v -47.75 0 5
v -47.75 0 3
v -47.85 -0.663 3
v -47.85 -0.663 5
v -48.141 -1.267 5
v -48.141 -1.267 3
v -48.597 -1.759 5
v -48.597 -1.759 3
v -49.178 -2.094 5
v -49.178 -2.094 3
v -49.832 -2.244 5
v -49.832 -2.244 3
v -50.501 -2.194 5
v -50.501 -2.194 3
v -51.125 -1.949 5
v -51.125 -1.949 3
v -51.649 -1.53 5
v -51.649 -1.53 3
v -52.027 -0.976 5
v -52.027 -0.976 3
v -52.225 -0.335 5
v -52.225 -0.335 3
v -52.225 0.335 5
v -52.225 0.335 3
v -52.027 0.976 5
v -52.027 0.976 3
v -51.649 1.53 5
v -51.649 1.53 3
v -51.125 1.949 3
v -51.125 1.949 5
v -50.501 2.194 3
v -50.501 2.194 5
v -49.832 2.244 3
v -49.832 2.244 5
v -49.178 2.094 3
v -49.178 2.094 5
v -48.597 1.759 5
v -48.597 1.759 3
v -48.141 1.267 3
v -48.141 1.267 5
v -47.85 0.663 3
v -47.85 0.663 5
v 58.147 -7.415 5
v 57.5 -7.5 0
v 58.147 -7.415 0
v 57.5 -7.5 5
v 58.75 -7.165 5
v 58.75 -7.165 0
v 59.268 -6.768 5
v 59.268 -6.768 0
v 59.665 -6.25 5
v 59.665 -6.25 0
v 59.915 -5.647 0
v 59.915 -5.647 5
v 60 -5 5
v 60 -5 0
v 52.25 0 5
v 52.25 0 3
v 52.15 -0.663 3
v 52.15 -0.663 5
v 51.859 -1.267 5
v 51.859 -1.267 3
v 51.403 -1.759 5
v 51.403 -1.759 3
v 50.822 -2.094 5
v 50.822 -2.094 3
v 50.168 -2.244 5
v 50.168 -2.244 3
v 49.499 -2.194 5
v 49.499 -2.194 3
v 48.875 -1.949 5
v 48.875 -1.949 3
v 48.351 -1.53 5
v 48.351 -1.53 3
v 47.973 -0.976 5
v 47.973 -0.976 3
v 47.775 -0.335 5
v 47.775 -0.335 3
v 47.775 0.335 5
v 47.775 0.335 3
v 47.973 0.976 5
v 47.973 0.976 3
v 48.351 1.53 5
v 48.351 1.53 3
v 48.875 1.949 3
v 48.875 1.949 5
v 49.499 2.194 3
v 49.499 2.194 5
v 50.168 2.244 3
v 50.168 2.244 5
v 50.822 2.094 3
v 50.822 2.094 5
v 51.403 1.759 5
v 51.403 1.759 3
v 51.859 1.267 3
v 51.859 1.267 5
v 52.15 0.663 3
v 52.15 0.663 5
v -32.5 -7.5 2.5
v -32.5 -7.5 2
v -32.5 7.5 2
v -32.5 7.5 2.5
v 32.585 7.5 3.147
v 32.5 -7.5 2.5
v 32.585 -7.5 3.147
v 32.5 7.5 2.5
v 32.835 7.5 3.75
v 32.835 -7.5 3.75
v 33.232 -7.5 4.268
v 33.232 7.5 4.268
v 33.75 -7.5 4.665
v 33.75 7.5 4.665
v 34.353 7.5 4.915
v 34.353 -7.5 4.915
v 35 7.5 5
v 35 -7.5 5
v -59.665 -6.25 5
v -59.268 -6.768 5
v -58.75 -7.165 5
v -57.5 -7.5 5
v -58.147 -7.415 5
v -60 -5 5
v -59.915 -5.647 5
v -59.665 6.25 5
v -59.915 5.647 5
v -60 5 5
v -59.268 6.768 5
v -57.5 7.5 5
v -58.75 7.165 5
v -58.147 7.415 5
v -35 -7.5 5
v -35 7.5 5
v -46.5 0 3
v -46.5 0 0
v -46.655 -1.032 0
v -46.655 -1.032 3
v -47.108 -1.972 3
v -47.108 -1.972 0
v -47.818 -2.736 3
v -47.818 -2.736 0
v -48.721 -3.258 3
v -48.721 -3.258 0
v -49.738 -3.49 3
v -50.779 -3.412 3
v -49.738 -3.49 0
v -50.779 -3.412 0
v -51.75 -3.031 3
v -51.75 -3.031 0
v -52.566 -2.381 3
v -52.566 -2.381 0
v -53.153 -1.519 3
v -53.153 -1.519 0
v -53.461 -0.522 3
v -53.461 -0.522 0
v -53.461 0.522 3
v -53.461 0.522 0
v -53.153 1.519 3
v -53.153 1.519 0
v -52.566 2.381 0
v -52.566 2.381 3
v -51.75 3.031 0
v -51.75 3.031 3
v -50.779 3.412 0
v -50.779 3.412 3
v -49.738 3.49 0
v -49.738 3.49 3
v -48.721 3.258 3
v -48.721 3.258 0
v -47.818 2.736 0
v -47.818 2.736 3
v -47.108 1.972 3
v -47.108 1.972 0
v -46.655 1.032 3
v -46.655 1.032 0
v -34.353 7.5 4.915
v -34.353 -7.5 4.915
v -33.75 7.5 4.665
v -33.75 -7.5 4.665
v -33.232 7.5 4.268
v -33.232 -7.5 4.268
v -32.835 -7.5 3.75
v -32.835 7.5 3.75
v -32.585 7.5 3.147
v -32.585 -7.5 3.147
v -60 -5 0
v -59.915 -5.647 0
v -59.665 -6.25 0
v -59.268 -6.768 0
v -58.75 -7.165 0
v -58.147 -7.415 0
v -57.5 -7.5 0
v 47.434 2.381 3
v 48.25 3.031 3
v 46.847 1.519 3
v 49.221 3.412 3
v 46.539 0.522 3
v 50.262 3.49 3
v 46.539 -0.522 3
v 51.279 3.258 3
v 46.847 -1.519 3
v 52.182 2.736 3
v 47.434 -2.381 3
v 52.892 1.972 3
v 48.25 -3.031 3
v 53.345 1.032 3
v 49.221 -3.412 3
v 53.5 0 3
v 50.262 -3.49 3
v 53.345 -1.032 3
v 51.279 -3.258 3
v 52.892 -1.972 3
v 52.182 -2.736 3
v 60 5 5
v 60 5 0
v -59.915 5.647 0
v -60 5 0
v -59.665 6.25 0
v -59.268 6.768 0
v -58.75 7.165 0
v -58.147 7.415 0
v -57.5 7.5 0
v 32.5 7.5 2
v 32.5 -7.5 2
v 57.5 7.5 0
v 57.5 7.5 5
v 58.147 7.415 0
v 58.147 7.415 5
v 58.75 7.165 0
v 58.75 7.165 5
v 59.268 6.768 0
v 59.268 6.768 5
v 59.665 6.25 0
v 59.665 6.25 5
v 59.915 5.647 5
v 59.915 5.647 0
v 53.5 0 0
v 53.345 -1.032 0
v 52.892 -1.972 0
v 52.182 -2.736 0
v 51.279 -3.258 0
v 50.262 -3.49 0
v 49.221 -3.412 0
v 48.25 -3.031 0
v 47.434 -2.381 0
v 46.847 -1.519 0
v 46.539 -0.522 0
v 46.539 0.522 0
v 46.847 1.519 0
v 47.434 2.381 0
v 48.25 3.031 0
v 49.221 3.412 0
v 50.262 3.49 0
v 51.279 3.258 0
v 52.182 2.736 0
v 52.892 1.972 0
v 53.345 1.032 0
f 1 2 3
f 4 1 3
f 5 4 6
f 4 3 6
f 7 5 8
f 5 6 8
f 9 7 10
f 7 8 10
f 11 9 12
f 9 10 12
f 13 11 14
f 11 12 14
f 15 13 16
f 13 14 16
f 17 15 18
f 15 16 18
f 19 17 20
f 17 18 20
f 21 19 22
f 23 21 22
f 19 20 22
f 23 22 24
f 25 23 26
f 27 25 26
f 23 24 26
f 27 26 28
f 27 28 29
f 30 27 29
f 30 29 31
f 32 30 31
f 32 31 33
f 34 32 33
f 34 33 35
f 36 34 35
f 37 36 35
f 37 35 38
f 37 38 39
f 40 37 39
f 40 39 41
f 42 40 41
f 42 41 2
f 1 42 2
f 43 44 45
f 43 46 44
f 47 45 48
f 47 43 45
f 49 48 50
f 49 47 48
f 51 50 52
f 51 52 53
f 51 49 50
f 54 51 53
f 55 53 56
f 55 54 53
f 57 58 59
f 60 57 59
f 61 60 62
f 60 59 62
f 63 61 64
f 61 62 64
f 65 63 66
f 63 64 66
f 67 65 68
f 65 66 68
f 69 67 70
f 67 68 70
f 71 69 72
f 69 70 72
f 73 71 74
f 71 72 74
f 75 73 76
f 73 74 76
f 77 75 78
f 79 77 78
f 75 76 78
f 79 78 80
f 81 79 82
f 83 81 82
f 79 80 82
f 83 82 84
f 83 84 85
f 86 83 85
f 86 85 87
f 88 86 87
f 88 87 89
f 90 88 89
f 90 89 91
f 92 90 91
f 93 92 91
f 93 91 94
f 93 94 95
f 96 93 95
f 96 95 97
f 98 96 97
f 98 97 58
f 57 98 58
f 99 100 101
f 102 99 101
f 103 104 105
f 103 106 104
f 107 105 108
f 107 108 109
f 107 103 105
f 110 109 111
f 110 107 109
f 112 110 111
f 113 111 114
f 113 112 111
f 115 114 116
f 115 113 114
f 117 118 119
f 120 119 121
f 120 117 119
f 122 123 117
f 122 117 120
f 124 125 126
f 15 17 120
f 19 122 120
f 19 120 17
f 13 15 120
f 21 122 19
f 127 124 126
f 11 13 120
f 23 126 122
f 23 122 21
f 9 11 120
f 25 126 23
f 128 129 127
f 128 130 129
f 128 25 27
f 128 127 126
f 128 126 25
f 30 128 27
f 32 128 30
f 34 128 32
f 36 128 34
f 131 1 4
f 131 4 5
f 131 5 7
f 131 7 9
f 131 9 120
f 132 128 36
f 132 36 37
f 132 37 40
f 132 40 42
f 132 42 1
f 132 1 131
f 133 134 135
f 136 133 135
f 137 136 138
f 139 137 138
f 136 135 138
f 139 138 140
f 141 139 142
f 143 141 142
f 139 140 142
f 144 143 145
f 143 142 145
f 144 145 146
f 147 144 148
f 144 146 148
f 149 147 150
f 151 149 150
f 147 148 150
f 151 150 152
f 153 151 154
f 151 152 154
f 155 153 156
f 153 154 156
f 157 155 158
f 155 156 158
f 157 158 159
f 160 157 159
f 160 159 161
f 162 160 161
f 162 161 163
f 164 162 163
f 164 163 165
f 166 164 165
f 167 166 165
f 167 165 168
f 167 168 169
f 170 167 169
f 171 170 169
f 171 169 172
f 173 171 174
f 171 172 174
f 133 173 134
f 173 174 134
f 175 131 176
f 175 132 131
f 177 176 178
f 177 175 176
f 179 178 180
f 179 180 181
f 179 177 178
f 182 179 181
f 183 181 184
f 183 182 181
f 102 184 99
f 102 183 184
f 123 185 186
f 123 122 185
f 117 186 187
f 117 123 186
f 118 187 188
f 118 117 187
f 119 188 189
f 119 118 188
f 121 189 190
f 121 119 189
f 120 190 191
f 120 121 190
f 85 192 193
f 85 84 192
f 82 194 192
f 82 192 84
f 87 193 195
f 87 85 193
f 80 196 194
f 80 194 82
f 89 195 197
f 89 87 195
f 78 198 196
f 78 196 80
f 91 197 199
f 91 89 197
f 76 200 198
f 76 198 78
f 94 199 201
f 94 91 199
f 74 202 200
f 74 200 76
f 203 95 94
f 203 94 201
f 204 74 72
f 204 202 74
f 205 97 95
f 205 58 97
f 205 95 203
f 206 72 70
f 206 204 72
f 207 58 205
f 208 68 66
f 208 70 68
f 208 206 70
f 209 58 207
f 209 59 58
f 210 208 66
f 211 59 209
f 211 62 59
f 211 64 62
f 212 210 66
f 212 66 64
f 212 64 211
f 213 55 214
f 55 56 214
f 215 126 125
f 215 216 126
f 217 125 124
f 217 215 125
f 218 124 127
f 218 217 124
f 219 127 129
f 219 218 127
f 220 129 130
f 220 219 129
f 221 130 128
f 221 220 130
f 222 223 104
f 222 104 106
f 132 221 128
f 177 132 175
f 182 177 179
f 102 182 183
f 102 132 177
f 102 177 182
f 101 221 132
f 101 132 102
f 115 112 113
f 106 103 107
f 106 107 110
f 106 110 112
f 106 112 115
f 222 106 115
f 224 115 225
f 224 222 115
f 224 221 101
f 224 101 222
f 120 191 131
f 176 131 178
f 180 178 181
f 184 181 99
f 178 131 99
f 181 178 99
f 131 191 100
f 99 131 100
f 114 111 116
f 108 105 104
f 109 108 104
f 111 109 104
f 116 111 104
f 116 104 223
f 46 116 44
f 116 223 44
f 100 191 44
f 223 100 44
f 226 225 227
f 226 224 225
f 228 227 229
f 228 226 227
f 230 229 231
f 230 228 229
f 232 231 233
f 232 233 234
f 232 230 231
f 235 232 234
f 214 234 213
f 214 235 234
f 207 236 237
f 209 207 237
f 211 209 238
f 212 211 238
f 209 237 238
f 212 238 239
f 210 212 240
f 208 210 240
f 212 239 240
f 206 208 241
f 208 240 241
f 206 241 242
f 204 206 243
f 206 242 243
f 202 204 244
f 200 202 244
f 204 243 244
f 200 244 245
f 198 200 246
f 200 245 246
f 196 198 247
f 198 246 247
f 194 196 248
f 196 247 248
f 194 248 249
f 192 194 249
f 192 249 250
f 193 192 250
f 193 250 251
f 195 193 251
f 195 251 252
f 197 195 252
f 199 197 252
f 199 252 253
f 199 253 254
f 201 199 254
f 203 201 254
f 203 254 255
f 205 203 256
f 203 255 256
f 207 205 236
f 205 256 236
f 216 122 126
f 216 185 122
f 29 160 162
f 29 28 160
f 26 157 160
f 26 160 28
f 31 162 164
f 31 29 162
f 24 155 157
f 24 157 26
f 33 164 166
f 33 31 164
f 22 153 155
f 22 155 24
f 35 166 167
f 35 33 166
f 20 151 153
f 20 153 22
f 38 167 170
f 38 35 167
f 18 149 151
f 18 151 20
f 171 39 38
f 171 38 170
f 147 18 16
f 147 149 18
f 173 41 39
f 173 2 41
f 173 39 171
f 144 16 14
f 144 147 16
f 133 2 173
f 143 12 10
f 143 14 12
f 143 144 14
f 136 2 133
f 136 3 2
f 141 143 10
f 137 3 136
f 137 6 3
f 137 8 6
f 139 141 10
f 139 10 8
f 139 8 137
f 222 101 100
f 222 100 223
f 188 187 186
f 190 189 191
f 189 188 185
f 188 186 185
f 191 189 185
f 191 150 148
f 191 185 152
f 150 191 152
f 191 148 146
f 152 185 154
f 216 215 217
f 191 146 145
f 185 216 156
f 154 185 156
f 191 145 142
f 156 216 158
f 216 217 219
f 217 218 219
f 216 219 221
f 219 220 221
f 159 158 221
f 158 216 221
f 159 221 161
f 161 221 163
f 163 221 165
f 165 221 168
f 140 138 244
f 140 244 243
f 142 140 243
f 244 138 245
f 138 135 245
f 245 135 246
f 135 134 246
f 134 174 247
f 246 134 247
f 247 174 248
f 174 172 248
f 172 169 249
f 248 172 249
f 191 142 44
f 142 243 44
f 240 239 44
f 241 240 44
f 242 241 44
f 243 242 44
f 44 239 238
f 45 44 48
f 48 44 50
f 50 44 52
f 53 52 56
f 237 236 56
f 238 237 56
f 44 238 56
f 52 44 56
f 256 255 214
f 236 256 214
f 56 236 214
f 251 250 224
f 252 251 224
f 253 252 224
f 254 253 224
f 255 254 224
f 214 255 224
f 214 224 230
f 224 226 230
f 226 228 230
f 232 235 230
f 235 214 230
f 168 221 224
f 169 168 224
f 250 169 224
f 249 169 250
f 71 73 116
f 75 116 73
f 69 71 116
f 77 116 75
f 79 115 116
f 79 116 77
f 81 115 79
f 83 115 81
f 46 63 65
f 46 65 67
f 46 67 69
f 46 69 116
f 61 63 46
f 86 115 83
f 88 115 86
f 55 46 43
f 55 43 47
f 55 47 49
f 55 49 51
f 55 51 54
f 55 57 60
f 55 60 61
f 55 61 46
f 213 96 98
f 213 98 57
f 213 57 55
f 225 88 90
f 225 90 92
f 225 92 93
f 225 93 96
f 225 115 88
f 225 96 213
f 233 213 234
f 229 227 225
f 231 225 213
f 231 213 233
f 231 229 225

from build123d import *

# Parameters (mm, degrees)
F0_W     = 120
F0_H     = 15
F1_DEPTH = 2
F2_W     = 27.5
F2_H     = 15
F3_DEPTH = 3
F4_R     = 2.25
F5_DEPTH = 5
F6_R     = 2.5
F4_R_2   = 3.5
F7_DEPTH = 3


with BuildPart() as f1:
    # F0 (on Top) → F1 (new body)
    with BuildSketch(Plane.XY):
        Rectangle(F0_W, F0_H)
    extrude(amount=F1_DEPTH)

    # F2 (on face) → F3 (join)
    with BuildSketch(Plane.XY.offset(2)):
        with Locations((-46.25, 0)):
            Rectangle(F2_W, F2_H)
        with Locations((46.25, 0)):
            Rectangle(F2_W, F2_H)
    extrude(amount=F3_DEPTH)

    # F4 (on face) → F5 (cut)
    with BuildSketch(Plane(origin=(0, 0, 0), x_dir=(1, 0, 0), z_dir=(0, 0, -1))):
        with Locations((-50, 0)):
            Circle(F4_R)
        with Locations((50, 0)):
            Circle(F4_R)
    extrude(amount=-F5_DEPTH, mode=Mode.SUBTRACT)

    # F6
    f6_edges = [f1.edges().sort_by_distance(p)[0] for p in [
        (60, 7.5, 2.5),
        (60, -7.5, 2.5),
        (-60, 7.5, 2.5),
        (-60, -7.5, 2.5),
        (32.5, 0, 5),
        (-32.5, 0, 5),
    ]]
    fillet(f6_edges, radius=F6_R)

    # F4 (on face) → F7 (cut)
    with BuildSketch(Plane(origin=(0, 0, 0), x_dir=(1, 0, 0), z_dir=(0, 0, -1))):
        with Locations((-50, 0)):
            Circle(F4_R_2)
        with Locations((-50, 0)):
            Circle(F4_R, mode=Mode.SUBTRACT)
        with Locations((50, 0)):
            Circle(F4_R_2)
        with Locations((50, 0)):
            Circle(F4_R, mode=Mode.SUBTRACT)
    extrude(amount=-F7_DEPTH, mode=Mode.SUBTRACT)


solid = f1.part
